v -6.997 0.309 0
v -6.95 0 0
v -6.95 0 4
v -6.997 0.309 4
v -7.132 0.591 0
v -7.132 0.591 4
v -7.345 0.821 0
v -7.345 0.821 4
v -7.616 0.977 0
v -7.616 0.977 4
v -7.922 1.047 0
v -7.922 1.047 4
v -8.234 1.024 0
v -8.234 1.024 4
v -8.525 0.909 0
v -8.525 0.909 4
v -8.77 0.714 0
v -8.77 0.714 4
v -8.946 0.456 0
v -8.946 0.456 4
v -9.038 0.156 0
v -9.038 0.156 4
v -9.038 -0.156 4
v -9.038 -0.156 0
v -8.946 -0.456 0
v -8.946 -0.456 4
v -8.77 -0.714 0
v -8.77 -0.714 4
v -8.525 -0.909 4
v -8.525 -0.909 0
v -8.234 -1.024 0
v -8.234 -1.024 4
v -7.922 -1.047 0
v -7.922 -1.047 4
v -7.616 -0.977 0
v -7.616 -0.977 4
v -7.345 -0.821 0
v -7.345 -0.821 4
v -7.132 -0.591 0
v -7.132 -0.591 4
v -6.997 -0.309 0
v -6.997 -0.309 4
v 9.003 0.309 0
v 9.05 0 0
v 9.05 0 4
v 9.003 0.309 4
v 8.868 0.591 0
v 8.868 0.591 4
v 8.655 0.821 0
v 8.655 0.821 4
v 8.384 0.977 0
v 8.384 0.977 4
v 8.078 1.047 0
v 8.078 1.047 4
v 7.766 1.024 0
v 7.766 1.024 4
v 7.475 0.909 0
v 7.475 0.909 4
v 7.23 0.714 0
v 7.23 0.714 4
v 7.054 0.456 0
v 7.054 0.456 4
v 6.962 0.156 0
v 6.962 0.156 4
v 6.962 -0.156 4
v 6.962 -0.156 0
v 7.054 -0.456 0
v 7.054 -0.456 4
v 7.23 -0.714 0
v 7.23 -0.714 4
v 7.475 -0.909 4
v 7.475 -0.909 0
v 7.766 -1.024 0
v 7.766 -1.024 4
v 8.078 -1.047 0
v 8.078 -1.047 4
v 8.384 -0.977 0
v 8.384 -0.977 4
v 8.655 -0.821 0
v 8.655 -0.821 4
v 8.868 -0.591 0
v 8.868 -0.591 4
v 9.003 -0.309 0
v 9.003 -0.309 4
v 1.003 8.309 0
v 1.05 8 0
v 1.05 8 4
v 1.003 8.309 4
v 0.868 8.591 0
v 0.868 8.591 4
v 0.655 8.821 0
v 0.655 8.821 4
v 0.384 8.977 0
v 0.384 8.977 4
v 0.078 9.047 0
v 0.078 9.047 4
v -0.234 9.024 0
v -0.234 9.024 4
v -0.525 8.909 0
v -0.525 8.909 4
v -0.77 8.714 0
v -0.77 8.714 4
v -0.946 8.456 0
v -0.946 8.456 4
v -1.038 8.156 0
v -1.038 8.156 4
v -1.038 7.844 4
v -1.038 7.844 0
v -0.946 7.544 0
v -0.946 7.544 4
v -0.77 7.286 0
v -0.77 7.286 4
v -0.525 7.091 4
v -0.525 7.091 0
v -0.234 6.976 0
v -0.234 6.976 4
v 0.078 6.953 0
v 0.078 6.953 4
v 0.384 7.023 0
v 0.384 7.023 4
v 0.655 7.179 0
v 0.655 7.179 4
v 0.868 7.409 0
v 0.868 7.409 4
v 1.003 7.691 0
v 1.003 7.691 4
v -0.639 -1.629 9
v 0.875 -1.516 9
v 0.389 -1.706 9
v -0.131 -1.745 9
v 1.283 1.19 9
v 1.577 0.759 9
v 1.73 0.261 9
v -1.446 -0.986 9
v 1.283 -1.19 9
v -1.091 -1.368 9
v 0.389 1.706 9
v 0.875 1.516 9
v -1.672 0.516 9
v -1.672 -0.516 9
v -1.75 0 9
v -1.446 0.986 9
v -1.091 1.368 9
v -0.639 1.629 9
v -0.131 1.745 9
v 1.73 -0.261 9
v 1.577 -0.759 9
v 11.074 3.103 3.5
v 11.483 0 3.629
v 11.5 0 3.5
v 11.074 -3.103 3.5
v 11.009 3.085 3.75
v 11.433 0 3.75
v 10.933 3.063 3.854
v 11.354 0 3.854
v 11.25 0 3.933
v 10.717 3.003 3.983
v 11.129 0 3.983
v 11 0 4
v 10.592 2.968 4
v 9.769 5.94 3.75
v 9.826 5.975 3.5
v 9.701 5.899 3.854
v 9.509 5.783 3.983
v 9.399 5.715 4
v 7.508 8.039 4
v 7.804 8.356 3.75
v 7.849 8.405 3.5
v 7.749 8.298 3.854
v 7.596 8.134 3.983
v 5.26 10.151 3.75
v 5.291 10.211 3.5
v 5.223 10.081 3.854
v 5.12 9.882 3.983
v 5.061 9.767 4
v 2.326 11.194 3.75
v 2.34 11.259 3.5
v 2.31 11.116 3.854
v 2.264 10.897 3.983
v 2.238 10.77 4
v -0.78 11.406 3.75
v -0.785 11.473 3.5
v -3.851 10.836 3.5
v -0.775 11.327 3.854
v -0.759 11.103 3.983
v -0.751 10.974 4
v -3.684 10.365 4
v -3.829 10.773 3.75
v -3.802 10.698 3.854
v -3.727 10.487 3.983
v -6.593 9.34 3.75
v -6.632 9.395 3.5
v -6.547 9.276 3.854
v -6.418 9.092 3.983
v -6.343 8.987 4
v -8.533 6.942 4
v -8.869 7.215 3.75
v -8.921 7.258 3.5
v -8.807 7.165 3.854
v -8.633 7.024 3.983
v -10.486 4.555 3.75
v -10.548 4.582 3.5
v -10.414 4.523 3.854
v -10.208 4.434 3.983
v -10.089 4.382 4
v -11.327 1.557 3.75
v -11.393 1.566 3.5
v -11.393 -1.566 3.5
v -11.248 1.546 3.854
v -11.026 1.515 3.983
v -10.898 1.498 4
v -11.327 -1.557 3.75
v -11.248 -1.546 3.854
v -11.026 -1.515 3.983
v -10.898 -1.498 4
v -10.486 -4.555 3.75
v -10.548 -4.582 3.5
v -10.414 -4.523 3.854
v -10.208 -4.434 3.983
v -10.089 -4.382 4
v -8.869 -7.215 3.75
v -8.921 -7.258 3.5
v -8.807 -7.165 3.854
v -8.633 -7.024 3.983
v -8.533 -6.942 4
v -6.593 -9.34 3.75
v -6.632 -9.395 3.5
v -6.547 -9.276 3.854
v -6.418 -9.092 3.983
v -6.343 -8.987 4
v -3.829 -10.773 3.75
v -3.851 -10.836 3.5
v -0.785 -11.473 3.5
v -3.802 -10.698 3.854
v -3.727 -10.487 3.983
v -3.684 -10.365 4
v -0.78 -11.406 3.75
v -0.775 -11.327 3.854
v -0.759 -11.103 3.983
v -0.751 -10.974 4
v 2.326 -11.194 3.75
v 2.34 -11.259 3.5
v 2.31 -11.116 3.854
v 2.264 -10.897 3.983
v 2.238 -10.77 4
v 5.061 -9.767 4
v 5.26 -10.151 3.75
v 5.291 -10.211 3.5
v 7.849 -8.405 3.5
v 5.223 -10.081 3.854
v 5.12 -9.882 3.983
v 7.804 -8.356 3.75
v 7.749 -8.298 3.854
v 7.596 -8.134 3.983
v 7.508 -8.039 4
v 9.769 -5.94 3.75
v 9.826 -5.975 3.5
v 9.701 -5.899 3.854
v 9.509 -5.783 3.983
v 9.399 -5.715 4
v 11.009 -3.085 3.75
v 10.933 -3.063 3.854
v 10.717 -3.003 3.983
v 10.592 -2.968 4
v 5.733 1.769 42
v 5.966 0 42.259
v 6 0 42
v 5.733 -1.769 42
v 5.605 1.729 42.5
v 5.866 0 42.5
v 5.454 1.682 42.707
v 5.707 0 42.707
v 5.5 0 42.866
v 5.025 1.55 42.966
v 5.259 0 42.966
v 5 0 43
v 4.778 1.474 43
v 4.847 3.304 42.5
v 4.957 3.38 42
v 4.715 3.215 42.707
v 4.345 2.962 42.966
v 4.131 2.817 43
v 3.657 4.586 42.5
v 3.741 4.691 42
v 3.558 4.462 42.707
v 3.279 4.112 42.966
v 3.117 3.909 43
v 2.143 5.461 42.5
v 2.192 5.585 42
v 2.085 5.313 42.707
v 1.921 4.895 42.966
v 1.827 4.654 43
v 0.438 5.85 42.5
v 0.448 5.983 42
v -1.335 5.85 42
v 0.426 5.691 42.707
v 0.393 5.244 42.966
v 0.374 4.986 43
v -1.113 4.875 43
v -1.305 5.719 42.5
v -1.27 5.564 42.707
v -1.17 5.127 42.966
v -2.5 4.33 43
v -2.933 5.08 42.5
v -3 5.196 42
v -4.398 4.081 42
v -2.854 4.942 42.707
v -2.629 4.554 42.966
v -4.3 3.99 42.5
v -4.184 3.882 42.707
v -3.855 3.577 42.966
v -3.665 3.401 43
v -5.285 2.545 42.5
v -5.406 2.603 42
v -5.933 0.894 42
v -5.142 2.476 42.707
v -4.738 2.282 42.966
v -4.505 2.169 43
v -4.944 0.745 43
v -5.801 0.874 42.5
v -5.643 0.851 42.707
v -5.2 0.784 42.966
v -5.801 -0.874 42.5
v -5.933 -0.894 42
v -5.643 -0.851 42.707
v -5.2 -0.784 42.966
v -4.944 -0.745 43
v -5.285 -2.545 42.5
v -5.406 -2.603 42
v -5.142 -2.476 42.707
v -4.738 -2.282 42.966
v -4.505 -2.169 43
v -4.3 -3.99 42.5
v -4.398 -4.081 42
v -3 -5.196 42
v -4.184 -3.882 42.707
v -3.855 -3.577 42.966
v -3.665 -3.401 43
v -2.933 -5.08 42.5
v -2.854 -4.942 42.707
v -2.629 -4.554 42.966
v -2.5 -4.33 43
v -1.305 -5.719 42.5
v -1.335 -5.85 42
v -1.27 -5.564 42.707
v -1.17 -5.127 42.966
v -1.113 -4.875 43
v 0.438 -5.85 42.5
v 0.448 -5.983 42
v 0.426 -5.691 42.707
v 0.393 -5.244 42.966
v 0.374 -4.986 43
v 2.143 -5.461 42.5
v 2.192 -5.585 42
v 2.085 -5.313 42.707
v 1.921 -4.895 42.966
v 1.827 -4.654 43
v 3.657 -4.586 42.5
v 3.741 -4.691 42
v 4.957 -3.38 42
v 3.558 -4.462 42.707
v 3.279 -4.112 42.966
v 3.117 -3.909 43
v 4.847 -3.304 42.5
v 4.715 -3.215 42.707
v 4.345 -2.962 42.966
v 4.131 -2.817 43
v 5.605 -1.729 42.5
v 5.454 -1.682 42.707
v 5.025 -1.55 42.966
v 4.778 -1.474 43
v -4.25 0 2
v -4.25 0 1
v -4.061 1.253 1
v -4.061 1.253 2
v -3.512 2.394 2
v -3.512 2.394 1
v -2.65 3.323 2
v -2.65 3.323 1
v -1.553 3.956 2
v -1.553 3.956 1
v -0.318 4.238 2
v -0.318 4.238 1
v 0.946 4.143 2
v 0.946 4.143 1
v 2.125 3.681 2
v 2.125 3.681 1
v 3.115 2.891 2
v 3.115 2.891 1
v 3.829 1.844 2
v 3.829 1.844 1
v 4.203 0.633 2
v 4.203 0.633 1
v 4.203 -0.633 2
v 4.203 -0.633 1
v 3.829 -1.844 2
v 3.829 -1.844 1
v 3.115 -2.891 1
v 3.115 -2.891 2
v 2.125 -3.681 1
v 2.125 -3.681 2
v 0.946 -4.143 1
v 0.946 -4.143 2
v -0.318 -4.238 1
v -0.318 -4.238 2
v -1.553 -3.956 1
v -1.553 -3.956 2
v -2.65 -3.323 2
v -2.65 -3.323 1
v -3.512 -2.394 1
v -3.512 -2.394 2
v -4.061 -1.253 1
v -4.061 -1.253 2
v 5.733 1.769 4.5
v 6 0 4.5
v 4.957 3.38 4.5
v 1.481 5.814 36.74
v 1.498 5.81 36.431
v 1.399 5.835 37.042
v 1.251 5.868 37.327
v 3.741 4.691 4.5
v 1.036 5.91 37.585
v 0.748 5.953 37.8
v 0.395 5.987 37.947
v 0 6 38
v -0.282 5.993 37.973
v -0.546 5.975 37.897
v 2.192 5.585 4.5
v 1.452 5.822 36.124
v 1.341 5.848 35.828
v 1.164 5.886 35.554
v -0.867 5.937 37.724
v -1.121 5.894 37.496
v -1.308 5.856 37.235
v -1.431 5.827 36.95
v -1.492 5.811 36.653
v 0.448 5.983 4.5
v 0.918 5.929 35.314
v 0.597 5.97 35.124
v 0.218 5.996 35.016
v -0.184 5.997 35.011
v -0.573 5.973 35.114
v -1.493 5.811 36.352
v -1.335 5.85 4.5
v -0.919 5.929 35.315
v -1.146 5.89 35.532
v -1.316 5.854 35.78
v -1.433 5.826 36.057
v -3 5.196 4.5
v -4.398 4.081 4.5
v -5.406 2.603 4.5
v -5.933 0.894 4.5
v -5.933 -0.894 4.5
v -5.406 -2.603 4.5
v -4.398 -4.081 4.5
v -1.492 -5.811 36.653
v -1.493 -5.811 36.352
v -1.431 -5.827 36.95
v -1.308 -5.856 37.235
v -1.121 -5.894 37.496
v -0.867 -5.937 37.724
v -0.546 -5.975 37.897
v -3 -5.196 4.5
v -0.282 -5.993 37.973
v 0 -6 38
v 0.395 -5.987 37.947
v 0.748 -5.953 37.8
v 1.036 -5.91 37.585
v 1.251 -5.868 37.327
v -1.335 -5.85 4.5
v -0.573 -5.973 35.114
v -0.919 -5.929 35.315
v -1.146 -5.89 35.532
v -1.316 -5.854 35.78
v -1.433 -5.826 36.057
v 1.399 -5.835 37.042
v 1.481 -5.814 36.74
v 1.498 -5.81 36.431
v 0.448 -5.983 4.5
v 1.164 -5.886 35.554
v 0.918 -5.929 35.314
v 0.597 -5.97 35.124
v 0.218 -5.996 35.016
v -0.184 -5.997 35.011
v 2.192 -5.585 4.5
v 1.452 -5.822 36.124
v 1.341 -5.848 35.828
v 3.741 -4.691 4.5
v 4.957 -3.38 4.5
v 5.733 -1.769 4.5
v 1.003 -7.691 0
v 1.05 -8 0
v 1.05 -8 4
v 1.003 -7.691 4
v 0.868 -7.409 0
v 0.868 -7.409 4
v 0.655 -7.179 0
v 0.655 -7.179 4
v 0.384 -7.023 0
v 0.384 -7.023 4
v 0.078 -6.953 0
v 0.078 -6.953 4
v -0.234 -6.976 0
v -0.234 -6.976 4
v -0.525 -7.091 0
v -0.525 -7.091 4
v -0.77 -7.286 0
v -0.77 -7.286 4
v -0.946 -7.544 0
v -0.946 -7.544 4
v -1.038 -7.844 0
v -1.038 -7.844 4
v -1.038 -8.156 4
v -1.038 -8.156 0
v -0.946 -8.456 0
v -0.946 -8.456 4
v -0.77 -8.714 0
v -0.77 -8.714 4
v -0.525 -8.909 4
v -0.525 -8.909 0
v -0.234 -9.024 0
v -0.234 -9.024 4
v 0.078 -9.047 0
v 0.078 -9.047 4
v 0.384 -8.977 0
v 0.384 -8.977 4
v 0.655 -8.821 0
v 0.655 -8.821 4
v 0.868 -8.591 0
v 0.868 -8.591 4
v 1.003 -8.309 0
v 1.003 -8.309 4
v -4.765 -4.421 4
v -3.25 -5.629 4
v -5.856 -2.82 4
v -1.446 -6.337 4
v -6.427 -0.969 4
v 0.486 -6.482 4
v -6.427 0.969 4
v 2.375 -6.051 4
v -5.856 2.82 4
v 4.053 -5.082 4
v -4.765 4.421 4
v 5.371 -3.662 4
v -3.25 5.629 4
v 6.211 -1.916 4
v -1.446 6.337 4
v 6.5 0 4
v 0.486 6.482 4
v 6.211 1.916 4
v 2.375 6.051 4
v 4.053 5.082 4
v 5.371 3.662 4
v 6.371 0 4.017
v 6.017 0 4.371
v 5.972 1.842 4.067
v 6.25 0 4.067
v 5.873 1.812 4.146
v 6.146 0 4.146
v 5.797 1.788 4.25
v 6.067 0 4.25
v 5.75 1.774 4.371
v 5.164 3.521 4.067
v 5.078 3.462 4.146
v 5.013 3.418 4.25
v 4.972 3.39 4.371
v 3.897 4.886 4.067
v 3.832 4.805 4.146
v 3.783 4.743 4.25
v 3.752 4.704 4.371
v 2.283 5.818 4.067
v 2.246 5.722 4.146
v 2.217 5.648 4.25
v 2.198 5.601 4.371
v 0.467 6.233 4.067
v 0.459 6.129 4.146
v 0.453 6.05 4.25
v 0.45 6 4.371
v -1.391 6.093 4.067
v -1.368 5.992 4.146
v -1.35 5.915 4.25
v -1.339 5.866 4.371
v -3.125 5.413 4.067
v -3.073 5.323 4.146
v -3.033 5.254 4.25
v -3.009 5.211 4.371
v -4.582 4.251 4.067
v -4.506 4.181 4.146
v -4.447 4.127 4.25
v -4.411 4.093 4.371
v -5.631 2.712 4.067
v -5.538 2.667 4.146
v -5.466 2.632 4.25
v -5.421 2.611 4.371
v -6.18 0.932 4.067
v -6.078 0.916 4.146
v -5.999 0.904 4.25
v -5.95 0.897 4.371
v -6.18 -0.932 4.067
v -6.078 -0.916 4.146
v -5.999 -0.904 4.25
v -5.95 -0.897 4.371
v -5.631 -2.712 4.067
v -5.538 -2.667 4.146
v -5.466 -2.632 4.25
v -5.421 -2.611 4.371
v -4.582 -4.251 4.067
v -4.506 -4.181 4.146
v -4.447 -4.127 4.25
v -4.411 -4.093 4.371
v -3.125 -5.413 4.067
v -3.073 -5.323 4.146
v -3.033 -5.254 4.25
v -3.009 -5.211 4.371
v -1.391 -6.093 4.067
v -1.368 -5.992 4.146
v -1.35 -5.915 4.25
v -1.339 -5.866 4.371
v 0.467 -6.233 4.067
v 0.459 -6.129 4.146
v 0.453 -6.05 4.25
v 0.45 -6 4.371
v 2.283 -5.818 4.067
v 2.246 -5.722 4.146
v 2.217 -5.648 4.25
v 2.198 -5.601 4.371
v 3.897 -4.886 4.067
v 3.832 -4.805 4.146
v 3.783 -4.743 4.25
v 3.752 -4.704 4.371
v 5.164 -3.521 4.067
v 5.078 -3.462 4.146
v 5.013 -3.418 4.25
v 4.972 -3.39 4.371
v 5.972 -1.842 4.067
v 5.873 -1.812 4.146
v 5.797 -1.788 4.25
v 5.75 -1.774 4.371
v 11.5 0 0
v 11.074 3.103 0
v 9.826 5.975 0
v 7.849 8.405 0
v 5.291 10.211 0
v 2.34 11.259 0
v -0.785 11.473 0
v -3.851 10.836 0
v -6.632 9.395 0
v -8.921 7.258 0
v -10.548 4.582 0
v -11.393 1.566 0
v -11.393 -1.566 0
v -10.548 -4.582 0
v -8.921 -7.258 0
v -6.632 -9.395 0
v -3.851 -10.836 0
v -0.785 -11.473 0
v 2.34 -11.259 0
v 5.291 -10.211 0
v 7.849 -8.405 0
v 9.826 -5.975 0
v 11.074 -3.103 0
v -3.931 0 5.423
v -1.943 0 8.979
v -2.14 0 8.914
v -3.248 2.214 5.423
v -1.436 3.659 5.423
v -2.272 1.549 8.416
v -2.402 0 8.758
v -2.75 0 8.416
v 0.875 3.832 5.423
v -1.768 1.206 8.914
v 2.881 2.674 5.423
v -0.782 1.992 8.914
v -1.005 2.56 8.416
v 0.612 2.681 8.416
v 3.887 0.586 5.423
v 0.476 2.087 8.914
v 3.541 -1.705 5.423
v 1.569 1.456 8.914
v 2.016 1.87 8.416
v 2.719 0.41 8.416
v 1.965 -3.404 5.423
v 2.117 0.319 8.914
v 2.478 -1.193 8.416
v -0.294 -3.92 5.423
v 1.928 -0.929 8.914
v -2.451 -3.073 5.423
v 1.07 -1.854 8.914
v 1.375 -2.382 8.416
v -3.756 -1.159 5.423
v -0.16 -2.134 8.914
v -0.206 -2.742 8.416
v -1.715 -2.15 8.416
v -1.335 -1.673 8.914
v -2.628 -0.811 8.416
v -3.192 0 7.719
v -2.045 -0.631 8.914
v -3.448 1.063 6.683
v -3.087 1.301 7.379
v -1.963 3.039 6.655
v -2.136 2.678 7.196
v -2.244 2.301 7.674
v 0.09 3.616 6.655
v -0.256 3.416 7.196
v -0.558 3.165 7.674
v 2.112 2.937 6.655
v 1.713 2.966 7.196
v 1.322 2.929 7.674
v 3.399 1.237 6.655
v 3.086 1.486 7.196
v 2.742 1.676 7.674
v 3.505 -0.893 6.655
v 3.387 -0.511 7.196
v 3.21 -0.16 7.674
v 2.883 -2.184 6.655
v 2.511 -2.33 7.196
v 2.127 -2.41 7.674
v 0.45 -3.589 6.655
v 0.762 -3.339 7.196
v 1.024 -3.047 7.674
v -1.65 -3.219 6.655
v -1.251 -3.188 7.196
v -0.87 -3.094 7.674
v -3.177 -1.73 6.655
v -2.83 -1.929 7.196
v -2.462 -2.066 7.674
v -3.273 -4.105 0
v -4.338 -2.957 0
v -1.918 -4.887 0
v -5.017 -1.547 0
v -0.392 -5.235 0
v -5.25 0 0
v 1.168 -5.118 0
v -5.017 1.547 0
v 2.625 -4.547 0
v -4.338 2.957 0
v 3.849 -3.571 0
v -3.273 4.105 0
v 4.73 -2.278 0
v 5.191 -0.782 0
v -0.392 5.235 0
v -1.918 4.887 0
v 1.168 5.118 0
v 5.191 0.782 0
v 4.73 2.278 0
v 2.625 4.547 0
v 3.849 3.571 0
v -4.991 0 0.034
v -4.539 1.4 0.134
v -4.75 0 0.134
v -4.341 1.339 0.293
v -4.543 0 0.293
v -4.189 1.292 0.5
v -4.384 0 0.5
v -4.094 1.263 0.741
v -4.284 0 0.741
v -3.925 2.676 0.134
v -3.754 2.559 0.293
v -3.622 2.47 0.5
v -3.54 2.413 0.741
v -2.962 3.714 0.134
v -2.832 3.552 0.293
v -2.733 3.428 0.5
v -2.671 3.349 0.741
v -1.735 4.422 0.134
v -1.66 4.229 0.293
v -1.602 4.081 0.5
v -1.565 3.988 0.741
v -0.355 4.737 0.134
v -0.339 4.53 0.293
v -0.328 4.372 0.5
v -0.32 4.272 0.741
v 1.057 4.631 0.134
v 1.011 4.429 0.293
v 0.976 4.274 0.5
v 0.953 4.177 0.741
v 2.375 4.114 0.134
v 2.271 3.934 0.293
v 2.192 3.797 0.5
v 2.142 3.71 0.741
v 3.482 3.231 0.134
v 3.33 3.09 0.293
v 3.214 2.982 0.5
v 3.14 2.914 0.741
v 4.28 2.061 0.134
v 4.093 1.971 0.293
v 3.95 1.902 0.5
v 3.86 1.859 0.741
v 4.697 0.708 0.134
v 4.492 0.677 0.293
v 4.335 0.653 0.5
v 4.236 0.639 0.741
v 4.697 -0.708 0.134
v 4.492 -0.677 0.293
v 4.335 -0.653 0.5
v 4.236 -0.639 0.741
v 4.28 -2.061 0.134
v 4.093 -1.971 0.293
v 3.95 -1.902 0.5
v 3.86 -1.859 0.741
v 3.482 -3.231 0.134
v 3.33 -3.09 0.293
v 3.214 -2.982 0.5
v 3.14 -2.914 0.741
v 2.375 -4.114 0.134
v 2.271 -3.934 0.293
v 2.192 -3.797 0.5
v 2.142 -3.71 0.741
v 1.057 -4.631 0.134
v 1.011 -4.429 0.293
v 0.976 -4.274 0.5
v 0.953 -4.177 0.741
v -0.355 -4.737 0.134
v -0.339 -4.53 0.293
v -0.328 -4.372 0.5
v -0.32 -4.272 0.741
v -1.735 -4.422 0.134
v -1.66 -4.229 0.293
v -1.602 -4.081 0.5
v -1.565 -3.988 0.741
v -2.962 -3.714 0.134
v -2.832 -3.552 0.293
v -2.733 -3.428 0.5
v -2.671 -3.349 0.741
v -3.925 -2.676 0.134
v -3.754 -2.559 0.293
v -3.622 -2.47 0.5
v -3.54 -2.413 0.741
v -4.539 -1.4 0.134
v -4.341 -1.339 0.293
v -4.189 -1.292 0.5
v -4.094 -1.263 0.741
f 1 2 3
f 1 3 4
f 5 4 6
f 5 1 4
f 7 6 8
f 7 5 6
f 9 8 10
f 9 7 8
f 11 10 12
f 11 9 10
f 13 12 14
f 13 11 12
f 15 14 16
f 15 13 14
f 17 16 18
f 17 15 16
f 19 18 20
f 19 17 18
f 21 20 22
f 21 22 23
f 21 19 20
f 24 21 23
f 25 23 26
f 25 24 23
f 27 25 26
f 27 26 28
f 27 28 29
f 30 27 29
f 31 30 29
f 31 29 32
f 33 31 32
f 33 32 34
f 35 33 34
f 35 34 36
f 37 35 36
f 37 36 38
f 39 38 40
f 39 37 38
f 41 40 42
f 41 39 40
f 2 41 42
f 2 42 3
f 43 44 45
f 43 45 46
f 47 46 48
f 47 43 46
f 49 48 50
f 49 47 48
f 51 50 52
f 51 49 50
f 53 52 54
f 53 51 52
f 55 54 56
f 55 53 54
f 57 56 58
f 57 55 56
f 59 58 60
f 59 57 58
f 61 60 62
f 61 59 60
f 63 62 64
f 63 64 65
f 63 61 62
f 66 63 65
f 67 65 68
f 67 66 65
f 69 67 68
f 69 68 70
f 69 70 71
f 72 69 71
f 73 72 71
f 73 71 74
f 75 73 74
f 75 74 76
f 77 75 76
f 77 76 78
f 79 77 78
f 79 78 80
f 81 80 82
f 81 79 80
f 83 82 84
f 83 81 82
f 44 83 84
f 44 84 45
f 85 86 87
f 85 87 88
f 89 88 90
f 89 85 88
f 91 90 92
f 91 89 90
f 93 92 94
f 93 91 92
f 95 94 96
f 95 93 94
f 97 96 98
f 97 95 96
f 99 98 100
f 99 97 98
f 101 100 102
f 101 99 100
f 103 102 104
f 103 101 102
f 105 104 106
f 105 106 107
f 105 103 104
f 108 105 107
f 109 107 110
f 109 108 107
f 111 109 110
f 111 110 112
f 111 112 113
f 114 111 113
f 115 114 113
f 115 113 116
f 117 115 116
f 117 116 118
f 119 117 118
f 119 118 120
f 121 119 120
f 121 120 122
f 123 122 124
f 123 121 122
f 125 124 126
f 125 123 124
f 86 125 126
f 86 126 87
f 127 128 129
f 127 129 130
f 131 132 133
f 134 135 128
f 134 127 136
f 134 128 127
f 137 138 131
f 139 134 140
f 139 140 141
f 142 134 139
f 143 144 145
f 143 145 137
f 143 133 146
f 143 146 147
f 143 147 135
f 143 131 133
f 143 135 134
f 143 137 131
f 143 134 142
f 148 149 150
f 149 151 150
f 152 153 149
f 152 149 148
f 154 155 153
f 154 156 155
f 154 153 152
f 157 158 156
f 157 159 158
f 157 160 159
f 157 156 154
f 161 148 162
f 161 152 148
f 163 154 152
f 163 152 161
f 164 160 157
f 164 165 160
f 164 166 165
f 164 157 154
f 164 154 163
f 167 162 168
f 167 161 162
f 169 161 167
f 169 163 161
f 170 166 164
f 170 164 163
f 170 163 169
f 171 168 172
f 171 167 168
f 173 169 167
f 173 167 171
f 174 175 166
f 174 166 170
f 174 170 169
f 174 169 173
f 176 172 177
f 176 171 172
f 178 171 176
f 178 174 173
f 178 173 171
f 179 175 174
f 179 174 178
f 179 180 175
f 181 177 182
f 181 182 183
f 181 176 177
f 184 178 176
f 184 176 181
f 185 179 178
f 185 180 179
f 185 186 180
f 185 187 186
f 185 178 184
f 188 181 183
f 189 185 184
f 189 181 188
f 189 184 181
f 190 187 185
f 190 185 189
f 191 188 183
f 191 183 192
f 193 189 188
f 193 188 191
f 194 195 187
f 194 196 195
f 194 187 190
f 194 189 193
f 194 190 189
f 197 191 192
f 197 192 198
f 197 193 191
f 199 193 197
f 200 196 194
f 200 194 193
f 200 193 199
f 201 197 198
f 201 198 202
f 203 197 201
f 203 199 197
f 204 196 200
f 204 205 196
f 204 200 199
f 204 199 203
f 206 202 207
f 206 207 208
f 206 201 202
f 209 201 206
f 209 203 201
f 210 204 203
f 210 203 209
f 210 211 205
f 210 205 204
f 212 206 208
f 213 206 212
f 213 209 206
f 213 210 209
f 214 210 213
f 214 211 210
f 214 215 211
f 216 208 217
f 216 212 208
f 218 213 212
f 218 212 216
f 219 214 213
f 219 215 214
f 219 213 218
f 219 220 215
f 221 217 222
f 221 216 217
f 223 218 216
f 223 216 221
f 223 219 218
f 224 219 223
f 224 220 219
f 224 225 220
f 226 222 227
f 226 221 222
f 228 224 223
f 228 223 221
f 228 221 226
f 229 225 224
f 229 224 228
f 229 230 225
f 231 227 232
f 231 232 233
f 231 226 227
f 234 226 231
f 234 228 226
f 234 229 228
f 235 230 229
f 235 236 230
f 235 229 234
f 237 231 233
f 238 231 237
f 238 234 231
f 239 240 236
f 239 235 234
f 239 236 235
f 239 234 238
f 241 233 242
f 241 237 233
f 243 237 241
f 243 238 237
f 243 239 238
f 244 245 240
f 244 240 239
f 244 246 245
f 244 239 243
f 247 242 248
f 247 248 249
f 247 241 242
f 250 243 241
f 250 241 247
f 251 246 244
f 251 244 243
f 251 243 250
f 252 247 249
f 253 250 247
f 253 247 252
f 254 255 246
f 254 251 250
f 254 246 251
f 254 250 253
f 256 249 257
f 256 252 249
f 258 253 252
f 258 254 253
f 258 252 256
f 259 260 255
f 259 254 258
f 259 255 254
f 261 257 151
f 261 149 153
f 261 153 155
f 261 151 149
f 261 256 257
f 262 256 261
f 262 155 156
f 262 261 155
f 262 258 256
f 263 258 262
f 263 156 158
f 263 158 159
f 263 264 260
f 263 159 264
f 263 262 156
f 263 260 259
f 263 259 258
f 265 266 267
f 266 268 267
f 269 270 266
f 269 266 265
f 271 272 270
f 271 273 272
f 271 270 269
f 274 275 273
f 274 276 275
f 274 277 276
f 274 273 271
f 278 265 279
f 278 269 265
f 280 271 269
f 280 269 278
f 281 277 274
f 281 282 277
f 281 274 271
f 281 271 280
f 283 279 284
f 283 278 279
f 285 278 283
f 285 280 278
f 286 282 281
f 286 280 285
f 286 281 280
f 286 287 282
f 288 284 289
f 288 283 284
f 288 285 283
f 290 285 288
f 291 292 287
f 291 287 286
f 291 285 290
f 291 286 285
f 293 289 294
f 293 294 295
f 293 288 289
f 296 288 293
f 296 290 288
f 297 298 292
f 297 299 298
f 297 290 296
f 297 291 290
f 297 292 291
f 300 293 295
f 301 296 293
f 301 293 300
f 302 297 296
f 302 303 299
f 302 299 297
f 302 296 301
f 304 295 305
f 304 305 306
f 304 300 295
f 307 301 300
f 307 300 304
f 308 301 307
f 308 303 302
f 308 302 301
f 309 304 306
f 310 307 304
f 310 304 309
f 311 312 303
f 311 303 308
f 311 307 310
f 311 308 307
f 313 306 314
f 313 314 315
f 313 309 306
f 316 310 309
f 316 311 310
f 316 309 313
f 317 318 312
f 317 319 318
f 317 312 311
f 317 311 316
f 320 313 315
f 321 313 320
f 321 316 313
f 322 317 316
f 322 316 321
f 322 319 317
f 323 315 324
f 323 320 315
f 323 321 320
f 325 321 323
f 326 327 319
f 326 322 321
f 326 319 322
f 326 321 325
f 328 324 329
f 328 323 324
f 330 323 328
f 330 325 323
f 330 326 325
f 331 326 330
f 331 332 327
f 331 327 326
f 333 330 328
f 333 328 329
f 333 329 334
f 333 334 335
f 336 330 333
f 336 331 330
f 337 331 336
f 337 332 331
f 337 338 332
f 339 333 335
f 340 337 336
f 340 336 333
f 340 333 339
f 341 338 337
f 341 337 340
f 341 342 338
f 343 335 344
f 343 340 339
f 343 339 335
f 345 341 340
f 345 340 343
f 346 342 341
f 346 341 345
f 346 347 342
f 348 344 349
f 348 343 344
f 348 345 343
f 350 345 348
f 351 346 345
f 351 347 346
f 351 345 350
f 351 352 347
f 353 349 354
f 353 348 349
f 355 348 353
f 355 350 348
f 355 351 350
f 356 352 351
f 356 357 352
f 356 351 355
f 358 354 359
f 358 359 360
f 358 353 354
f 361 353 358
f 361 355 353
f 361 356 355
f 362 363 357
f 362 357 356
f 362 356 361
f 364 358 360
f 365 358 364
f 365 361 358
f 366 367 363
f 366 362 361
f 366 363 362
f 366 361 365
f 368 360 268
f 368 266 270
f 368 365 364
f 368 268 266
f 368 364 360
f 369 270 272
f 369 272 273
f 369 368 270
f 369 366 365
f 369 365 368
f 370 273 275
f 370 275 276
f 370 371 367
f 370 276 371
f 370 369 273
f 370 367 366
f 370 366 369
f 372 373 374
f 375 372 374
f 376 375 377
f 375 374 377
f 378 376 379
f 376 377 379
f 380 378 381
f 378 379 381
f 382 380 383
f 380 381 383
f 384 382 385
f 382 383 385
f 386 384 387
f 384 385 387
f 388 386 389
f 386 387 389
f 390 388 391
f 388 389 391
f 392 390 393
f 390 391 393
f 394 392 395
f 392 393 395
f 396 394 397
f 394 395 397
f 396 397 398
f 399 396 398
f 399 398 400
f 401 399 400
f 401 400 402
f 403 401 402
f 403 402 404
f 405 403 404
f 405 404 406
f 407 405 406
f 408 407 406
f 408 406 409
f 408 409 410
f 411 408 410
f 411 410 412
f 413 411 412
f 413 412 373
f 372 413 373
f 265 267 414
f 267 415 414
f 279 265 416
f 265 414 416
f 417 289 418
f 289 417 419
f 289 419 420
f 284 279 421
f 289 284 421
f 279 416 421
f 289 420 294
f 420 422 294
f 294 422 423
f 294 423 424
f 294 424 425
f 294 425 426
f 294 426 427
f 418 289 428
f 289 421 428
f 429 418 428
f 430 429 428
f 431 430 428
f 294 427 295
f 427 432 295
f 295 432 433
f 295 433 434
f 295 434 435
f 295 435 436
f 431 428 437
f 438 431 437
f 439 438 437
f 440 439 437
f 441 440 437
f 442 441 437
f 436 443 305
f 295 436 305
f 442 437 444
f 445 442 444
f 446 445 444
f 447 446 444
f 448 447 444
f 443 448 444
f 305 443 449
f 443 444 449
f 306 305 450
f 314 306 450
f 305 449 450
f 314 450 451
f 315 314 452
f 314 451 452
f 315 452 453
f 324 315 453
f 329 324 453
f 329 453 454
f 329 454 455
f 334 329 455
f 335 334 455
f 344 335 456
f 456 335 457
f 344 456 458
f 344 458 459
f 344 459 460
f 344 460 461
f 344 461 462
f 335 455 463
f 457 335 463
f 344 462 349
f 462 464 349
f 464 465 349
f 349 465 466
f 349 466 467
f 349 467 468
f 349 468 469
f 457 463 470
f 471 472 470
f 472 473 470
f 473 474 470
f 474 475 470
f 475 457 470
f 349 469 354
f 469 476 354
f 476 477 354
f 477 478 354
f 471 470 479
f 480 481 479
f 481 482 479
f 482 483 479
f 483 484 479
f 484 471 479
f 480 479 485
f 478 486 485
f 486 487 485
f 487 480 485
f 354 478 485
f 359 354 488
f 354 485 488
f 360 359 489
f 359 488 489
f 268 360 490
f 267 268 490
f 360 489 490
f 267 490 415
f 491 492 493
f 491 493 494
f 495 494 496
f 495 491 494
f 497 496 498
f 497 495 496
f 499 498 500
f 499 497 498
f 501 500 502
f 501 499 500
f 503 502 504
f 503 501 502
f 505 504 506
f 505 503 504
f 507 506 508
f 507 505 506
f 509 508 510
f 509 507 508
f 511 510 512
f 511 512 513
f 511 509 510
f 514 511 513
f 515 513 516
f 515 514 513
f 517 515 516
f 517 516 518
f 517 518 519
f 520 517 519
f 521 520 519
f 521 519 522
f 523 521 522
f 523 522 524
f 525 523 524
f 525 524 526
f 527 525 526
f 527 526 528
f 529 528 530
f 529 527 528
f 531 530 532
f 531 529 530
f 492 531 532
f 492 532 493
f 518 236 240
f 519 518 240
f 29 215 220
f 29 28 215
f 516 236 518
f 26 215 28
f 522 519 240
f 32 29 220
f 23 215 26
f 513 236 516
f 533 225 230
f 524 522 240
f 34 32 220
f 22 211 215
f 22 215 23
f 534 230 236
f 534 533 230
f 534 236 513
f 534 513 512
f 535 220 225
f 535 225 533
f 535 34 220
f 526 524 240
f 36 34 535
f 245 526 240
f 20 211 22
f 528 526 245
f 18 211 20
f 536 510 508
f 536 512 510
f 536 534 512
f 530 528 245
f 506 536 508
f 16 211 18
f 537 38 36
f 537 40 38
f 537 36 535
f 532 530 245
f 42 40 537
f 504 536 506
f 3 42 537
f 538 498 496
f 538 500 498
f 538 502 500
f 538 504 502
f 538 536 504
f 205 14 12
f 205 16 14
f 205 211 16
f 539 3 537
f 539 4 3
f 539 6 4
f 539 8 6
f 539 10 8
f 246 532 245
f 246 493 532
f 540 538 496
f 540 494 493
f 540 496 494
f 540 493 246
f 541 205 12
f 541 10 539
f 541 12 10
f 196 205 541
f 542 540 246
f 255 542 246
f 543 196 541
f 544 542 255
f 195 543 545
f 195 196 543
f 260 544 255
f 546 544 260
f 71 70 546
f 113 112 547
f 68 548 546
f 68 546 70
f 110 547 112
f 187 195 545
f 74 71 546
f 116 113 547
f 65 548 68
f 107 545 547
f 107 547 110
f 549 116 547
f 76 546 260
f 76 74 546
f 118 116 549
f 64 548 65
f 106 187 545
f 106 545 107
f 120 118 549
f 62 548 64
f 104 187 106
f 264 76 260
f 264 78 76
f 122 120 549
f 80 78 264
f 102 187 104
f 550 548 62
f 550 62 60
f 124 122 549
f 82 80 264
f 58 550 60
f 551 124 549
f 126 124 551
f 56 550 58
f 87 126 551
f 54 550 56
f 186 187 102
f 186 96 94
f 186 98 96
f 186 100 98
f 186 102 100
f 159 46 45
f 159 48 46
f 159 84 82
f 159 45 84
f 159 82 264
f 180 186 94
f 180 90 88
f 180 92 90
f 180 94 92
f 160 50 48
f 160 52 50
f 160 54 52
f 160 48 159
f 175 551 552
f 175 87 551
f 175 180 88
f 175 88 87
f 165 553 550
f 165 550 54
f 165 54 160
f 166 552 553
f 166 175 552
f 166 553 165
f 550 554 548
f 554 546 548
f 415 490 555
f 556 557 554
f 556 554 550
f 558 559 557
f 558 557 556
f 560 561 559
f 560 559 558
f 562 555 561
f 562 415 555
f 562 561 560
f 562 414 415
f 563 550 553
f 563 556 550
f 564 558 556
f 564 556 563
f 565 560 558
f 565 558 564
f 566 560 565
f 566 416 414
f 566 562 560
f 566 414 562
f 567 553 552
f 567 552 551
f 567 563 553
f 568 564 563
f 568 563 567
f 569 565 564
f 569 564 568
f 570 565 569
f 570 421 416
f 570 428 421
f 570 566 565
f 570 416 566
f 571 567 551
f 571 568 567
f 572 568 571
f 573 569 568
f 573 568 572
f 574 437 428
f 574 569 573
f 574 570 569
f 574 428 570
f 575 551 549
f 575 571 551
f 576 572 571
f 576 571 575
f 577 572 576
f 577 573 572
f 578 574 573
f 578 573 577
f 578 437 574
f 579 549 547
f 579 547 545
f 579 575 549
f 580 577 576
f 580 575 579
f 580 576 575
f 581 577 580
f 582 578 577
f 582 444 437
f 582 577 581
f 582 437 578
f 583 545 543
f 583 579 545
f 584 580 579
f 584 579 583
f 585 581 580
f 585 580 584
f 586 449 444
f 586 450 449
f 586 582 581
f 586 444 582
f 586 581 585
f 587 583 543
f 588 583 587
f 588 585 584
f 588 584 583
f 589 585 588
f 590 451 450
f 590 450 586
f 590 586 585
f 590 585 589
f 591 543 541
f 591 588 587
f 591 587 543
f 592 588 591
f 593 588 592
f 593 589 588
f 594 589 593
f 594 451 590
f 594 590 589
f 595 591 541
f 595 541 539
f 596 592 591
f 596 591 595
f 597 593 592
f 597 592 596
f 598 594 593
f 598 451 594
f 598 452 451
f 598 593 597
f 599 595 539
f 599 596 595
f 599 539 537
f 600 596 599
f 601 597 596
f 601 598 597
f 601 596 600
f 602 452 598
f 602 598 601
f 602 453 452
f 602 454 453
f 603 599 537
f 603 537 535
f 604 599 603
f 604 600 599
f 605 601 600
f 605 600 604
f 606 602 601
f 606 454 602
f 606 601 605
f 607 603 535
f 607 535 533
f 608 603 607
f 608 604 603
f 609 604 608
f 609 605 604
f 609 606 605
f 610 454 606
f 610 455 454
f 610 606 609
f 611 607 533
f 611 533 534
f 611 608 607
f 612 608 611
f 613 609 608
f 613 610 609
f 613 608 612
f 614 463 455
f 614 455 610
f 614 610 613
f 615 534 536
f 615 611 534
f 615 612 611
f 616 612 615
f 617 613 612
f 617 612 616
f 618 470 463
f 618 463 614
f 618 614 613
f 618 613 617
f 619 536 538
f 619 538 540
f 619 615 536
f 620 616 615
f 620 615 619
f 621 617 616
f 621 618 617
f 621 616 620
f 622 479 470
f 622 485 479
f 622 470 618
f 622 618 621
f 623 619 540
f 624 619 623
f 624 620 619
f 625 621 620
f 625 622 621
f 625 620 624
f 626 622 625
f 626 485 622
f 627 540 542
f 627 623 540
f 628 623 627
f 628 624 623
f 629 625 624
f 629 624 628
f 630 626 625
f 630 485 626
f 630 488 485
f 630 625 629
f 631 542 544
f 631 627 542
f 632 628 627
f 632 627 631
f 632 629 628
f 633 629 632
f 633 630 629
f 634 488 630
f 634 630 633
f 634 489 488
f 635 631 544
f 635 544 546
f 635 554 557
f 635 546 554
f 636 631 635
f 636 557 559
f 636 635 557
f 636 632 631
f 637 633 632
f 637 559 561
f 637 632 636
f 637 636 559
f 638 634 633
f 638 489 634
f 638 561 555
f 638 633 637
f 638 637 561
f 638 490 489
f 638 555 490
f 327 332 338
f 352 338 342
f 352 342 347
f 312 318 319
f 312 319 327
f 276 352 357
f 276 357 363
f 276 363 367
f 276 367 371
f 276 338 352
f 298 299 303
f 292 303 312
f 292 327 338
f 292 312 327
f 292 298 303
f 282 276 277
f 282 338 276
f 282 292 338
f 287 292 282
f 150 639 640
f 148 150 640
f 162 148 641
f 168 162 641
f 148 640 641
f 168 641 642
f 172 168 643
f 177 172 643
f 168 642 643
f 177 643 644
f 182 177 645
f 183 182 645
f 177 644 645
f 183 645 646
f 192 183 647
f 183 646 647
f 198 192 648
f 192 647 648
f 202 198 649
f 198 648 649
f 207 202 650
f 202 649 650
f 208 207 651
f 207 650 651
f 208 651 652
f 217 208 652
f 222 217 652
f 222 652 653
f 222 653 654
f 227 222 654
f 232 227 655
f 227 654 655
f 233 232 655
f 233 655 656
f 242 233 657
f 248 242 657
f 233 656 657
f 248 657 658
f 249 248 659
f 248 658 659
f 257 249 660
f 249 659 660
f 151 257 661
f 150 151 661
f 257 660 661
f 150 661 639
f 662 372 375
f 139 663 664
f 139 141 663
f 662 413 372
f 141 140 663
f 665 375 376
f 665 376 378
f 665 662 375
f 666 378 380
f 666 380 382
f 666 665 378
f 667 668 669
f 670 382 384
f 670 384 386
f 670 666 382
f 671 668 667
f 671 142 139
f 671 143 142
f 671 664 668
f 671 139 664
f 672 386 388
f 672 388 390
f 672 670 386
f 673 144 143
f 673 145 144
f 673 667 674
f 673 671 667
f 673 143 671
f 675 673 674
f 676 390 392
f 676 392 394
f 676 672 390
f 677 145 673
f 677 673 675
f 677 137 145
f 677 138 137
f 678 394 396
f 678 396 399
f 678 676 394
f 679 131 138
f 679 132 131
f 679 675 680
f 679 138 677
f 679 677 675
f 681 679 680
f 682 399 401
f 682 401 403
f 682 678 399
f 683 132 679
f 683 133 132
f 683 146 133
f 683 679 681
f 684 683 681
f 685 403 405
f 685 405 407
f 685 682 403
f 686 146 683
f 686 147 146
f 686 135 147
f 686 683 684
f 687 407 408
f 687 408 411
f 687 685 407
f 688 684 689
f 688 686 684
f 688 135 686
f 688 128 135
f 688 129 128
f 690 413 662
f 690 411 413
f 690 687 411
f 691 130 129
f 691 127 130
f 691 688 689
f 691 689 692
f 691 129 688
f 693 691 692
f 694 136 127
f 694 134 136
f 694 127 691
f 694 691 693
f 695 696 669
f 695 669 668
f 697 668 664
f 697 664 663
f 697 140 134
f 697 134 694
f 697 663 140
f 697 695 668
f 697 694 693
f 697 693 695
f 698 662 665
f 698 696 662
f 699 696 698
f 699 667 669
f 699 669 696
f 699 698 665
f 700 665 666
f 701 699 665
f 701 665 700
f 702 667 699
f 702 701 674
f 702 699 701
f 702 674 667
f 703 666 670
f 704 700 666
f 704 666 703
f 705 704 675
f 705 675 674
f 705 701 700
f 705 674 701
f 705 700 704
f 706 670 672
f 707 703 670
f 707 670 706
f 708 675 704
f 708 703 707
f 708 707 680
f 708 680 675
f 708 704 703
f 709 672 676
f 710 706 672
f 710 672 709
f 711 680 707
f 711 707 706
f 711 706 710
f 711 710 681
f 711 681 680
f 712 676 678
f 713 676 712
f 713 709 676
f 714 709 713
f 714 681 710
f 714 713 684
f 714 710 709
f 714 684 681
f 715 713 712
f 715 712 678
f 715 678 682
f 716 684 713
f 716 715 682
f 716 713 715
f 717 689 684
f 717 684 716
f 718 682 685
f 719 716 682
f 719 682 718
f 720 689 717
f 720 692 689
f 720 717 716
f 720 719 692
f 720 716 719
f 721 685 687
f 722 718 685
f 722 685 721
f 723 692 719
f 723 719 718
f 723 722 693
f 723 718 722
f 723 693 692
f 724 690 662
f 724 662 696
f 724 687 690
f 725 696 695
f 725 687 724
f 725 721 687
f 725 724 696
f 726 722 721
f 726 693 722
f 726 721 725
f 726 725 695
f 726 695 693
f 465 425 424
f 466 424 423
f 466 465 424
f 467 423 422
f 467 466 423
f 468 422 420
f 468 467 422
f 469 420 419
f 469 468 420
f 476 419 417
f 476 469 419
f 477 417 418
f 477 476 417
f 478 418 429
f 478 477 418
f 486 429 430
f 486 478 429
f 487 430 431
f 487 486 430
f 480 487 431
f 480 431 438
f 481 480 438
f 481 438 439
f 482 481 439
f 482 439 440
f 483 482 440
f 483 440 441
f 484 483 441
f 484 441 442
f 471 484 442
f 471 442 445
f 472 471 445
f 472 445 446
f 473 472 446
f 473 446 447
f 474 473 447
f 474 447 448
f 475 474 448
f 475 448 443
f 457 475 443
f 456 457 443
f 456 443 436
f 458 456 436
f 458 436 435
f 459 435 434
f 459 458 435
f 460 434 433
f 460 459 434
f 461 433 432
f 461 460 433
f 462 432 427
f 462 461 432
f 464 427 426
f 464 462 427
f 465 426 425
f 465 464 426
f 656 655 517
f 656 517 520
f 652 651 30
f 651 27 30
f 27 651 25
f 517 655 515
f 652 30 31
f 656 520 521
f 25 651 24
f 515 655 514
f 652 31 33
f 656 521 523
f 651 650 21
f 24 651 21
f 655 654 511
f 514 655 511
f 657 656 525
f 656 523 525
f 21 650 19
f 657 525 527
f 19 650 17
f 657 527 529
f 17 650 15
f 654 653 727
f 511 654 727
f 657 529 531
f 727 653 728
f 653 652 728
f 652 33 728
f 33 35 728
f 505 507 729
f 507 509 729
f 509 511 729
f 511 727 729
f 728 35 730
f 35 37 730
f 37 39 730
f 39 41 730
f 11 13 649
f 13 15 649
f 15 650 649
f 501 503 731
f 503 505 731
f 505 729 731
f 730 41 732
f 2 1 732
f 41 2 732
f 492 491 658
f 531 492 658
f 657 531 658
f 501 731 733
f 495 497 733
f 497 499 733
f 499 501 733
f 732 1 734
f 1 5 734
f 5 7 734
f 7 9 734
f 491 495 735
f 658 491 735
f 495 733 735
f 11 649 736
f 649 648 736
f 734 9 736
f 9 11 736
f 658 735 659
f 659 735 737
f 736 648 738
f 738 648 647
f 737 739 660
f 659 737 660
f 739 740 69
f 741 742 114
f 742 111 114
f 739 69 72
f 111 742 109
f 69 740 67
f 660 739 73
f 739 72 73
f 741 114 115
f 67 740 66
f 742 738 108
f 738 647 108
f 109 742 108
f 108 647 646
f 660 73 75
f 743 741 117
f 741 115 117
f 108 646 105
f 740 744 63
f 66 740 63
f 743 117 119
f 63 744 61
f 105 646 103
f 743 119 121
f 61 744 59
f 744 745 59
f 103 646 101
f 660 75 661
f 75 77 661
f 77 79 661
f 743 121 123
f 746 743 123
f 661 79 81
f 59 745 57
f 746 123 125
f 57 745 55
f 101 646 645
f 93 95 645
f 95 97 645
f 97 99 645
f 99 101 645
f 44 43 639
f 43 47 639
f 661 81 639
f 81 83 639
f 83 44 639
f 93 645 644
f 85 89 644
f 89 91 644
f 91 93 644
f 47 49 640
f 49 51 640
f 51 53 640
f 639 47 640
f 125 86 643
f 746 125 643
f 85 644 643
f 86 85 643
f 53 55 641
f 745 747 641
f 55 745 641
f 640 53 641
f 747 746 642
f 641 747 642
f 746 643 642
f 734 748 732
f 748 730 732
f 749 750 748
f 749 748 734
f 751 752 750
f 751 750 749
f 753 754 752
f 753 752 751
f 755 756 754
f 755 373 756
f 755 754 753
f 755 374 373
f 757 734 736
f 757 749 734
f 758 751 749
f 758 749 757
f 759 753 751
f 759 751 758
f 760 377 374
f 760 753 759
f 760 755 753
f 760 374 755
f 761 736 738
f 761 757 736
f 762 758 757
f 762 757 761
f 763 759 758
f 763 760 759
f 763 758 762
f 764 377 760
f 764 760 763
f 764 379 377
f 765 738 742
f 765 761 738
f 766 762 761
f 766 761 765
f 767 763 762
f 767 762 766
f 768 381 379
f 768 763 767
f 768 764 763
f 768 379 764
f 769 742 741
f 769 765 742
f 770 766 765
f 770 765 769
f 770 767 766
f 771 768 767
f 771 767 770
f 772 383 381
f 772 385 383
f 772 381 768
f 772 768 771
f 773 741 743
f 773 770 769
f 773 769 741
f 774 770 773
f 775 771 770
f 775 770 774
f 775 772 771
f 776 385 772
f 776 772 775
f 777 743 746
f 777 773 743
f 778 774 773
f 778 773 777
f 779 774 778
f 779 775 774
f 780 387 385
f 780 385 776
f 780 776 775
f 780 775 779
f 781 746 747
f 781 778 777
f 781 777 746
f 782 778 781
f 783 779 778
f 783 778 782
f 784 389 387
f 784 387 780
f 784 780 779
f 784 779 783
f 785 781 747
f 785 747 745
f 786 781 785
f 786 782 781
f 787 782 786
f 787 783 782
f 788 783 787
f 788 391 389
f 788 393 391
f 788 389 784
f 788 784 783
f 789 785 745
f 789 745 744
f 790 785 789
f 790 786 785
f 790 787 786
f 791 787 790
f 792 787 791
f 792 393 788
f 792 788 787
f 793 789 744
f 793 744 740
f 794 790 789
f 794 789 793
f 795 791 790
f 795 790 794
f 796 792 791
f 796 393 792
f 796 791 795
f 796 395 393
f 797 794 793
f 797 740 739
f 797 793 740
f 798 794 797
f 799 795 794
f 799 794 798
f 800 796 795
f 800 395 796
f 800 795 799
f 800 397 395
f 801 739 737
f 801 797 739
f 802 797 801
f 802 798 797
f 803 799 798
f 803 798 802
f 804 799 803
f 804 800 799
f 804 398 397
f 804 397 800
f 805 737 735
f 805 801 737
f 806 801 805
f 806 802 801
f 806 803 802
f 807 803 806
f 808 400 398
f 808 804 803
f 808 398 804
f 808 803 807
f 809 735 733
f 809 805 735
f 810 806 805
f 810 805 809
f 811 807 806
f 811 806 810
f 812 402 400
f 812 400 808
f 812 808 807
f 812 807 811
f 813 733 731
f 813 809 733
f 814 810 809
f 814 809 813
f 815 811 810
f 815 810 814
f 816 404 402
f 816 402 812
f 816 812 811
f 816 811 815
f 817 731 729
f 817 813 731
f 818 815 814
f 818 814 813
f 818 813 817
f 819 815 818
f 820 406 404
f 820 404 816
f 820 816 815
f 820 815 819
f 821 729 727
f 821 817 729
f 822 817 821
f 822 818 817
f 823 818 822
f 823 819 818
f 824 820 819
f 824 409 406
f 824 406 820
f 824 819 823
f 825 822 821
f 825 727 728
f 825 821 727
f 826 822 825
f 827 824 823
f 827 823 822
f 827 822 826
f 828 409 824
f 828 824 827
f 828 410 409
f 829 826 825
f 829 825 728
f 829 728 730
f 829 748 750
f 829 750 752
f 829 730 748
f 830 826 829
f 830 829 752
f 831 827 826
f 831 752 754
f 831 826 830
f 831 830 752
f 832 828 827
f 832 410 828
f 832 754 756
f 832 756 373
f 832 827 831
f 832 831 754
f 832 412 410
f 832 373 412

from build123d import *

# Parameters (mm, degrees)
SKETCH1_R               = 11.5
SKETCH1_R_2             = 1.05
BOSS_EXTRUDE1_DEPTH     = 4
SKETCH2_R               = 6
BOSS_EXTRUDE2_DEPTH     = 39
SKETCH3_R               = 4.25
CUT_EXTRUDE1_DEPTH      = 9
FILLET1_R               = 0.5
FILLET2_R               = 1
FILLET4_R               = 1
FILLET5_SIZE            = 7
FILLET5_SIZE_2          = 2.5
CUT_EXTRUDE2_DEPTH      = 46.972818106
CUT_EXTRUDE2_DEPTH_BACK = 46.972818106
SKETCH5_R               = 1.5


with BuildPart() as part:
    # Sketch1 → Boss-Extrude1 (new body)
    with BuildSketch(Plane.XY):
        Circle(SKETCH1_R)
        with Locations((-8, 0)):
            Circle(SKETCH1_R_2, mode=Mode.SUBTRACT)
        with Locations((0, -8)):
            Circle(SKETCH1_R_2, mode=Mode.SUBTRACT)
        with Locations((8, 0)):
            Circle(SKETCH1_R_2, mode=Mode.SUBTRACT)
        with Locations((0, 8)):
            Circle(SKETCH1_R_2, mode=Mode.SUBTRACT)
    extrude(amount=BOSS_EXTRUDE1_DEPTH)

    # Sketch2 → Boss-Extrude2 (add)
    with BuildSketch(Plane.XY.offset(4)):
        Circle(SKETCH2_R)
    extrude(amount=BOSS_EXTRUDE2_DEPTH)

    # Sketch3 → Cut-Extrude1 (cut)
    with BuildSketch(Plane(origin=(0, 0, 0), x_dir=(-1, 0, 0), z_dir=(0, 0, -1))):
        Circle(SKETCH3_R)
    extrude(amount=-CUT_EXTRUDE1_DEPTH, mode=Mode.SUBTRACT)

    # Fillet1
    fillet1_edges = [part.edges().sort_by_distance(p)[0] for p in [
        (-6, 0, 4),
        (-11.5, 0, 4),
    ]]
    fillet(fillet1_edges, radius=FILLET1_R)

    # Fillet2
    fillet2_edges = [part.edges().sort_by_distance(p)[0] for p in [
        (-6, 0, 43),
    ]]
    fillet(fillet2_edges, radius=FILLET2_R)

    # Fillet4
    fillet4_edges = [part.edges().sort_by_distance(p)[0] for p in [
        (4.25, 0, 0),
    ]]
    fillet(fillet4_edges, radius=FILLET4_R)

    # Fillet5
    # an asymmetric fillet: 7, 2.5 mm, written as the material it adds along each edge
    with BuildSketch(Plane(origin=(0, 0, 9), x_dir=(-1, 0, 0), z_dir=(0, -1, 0))) as fillet5_piece_1:
        with BuildLine():
            Bezier((4.25, FILLET5_SIZE), (4.25, 0), (4.25 - FILLET5_SIZE_2, 0), weights=[1, 0.707106781, 1])
            Line((4.25 - FILLET5_SIZE_2, 0), (4.25, 0))
            Line((4.25, 0), (4.25, FILLET5_SIZE))
        make_face()
    revolve(axis=Axis((0, 0, 9), (0, 0, -1)))

    # Sketch5 → Cut-Extrude2 (cut, two sides: drawn at the far end of the back side and taken through both)
    with BuildSketch(Plane(origin=(0, 0, 0), x_dir=(1, 0, 0), z_dir=(0, 1, 0)).offset(-CUT_EXTRUDE2_DEPTH_BACK)):
        with Locations(Location((0, -36.5, 0), (0, 0, 270))):
            Circle(SKETCH5_R)
    extrude(amount=CUT_EXTRUDE2_DEPTH + CUT_EXTRUDE2_DEPTH_BACK, mode=Mode.SUBTRACT)


solid = part.part
